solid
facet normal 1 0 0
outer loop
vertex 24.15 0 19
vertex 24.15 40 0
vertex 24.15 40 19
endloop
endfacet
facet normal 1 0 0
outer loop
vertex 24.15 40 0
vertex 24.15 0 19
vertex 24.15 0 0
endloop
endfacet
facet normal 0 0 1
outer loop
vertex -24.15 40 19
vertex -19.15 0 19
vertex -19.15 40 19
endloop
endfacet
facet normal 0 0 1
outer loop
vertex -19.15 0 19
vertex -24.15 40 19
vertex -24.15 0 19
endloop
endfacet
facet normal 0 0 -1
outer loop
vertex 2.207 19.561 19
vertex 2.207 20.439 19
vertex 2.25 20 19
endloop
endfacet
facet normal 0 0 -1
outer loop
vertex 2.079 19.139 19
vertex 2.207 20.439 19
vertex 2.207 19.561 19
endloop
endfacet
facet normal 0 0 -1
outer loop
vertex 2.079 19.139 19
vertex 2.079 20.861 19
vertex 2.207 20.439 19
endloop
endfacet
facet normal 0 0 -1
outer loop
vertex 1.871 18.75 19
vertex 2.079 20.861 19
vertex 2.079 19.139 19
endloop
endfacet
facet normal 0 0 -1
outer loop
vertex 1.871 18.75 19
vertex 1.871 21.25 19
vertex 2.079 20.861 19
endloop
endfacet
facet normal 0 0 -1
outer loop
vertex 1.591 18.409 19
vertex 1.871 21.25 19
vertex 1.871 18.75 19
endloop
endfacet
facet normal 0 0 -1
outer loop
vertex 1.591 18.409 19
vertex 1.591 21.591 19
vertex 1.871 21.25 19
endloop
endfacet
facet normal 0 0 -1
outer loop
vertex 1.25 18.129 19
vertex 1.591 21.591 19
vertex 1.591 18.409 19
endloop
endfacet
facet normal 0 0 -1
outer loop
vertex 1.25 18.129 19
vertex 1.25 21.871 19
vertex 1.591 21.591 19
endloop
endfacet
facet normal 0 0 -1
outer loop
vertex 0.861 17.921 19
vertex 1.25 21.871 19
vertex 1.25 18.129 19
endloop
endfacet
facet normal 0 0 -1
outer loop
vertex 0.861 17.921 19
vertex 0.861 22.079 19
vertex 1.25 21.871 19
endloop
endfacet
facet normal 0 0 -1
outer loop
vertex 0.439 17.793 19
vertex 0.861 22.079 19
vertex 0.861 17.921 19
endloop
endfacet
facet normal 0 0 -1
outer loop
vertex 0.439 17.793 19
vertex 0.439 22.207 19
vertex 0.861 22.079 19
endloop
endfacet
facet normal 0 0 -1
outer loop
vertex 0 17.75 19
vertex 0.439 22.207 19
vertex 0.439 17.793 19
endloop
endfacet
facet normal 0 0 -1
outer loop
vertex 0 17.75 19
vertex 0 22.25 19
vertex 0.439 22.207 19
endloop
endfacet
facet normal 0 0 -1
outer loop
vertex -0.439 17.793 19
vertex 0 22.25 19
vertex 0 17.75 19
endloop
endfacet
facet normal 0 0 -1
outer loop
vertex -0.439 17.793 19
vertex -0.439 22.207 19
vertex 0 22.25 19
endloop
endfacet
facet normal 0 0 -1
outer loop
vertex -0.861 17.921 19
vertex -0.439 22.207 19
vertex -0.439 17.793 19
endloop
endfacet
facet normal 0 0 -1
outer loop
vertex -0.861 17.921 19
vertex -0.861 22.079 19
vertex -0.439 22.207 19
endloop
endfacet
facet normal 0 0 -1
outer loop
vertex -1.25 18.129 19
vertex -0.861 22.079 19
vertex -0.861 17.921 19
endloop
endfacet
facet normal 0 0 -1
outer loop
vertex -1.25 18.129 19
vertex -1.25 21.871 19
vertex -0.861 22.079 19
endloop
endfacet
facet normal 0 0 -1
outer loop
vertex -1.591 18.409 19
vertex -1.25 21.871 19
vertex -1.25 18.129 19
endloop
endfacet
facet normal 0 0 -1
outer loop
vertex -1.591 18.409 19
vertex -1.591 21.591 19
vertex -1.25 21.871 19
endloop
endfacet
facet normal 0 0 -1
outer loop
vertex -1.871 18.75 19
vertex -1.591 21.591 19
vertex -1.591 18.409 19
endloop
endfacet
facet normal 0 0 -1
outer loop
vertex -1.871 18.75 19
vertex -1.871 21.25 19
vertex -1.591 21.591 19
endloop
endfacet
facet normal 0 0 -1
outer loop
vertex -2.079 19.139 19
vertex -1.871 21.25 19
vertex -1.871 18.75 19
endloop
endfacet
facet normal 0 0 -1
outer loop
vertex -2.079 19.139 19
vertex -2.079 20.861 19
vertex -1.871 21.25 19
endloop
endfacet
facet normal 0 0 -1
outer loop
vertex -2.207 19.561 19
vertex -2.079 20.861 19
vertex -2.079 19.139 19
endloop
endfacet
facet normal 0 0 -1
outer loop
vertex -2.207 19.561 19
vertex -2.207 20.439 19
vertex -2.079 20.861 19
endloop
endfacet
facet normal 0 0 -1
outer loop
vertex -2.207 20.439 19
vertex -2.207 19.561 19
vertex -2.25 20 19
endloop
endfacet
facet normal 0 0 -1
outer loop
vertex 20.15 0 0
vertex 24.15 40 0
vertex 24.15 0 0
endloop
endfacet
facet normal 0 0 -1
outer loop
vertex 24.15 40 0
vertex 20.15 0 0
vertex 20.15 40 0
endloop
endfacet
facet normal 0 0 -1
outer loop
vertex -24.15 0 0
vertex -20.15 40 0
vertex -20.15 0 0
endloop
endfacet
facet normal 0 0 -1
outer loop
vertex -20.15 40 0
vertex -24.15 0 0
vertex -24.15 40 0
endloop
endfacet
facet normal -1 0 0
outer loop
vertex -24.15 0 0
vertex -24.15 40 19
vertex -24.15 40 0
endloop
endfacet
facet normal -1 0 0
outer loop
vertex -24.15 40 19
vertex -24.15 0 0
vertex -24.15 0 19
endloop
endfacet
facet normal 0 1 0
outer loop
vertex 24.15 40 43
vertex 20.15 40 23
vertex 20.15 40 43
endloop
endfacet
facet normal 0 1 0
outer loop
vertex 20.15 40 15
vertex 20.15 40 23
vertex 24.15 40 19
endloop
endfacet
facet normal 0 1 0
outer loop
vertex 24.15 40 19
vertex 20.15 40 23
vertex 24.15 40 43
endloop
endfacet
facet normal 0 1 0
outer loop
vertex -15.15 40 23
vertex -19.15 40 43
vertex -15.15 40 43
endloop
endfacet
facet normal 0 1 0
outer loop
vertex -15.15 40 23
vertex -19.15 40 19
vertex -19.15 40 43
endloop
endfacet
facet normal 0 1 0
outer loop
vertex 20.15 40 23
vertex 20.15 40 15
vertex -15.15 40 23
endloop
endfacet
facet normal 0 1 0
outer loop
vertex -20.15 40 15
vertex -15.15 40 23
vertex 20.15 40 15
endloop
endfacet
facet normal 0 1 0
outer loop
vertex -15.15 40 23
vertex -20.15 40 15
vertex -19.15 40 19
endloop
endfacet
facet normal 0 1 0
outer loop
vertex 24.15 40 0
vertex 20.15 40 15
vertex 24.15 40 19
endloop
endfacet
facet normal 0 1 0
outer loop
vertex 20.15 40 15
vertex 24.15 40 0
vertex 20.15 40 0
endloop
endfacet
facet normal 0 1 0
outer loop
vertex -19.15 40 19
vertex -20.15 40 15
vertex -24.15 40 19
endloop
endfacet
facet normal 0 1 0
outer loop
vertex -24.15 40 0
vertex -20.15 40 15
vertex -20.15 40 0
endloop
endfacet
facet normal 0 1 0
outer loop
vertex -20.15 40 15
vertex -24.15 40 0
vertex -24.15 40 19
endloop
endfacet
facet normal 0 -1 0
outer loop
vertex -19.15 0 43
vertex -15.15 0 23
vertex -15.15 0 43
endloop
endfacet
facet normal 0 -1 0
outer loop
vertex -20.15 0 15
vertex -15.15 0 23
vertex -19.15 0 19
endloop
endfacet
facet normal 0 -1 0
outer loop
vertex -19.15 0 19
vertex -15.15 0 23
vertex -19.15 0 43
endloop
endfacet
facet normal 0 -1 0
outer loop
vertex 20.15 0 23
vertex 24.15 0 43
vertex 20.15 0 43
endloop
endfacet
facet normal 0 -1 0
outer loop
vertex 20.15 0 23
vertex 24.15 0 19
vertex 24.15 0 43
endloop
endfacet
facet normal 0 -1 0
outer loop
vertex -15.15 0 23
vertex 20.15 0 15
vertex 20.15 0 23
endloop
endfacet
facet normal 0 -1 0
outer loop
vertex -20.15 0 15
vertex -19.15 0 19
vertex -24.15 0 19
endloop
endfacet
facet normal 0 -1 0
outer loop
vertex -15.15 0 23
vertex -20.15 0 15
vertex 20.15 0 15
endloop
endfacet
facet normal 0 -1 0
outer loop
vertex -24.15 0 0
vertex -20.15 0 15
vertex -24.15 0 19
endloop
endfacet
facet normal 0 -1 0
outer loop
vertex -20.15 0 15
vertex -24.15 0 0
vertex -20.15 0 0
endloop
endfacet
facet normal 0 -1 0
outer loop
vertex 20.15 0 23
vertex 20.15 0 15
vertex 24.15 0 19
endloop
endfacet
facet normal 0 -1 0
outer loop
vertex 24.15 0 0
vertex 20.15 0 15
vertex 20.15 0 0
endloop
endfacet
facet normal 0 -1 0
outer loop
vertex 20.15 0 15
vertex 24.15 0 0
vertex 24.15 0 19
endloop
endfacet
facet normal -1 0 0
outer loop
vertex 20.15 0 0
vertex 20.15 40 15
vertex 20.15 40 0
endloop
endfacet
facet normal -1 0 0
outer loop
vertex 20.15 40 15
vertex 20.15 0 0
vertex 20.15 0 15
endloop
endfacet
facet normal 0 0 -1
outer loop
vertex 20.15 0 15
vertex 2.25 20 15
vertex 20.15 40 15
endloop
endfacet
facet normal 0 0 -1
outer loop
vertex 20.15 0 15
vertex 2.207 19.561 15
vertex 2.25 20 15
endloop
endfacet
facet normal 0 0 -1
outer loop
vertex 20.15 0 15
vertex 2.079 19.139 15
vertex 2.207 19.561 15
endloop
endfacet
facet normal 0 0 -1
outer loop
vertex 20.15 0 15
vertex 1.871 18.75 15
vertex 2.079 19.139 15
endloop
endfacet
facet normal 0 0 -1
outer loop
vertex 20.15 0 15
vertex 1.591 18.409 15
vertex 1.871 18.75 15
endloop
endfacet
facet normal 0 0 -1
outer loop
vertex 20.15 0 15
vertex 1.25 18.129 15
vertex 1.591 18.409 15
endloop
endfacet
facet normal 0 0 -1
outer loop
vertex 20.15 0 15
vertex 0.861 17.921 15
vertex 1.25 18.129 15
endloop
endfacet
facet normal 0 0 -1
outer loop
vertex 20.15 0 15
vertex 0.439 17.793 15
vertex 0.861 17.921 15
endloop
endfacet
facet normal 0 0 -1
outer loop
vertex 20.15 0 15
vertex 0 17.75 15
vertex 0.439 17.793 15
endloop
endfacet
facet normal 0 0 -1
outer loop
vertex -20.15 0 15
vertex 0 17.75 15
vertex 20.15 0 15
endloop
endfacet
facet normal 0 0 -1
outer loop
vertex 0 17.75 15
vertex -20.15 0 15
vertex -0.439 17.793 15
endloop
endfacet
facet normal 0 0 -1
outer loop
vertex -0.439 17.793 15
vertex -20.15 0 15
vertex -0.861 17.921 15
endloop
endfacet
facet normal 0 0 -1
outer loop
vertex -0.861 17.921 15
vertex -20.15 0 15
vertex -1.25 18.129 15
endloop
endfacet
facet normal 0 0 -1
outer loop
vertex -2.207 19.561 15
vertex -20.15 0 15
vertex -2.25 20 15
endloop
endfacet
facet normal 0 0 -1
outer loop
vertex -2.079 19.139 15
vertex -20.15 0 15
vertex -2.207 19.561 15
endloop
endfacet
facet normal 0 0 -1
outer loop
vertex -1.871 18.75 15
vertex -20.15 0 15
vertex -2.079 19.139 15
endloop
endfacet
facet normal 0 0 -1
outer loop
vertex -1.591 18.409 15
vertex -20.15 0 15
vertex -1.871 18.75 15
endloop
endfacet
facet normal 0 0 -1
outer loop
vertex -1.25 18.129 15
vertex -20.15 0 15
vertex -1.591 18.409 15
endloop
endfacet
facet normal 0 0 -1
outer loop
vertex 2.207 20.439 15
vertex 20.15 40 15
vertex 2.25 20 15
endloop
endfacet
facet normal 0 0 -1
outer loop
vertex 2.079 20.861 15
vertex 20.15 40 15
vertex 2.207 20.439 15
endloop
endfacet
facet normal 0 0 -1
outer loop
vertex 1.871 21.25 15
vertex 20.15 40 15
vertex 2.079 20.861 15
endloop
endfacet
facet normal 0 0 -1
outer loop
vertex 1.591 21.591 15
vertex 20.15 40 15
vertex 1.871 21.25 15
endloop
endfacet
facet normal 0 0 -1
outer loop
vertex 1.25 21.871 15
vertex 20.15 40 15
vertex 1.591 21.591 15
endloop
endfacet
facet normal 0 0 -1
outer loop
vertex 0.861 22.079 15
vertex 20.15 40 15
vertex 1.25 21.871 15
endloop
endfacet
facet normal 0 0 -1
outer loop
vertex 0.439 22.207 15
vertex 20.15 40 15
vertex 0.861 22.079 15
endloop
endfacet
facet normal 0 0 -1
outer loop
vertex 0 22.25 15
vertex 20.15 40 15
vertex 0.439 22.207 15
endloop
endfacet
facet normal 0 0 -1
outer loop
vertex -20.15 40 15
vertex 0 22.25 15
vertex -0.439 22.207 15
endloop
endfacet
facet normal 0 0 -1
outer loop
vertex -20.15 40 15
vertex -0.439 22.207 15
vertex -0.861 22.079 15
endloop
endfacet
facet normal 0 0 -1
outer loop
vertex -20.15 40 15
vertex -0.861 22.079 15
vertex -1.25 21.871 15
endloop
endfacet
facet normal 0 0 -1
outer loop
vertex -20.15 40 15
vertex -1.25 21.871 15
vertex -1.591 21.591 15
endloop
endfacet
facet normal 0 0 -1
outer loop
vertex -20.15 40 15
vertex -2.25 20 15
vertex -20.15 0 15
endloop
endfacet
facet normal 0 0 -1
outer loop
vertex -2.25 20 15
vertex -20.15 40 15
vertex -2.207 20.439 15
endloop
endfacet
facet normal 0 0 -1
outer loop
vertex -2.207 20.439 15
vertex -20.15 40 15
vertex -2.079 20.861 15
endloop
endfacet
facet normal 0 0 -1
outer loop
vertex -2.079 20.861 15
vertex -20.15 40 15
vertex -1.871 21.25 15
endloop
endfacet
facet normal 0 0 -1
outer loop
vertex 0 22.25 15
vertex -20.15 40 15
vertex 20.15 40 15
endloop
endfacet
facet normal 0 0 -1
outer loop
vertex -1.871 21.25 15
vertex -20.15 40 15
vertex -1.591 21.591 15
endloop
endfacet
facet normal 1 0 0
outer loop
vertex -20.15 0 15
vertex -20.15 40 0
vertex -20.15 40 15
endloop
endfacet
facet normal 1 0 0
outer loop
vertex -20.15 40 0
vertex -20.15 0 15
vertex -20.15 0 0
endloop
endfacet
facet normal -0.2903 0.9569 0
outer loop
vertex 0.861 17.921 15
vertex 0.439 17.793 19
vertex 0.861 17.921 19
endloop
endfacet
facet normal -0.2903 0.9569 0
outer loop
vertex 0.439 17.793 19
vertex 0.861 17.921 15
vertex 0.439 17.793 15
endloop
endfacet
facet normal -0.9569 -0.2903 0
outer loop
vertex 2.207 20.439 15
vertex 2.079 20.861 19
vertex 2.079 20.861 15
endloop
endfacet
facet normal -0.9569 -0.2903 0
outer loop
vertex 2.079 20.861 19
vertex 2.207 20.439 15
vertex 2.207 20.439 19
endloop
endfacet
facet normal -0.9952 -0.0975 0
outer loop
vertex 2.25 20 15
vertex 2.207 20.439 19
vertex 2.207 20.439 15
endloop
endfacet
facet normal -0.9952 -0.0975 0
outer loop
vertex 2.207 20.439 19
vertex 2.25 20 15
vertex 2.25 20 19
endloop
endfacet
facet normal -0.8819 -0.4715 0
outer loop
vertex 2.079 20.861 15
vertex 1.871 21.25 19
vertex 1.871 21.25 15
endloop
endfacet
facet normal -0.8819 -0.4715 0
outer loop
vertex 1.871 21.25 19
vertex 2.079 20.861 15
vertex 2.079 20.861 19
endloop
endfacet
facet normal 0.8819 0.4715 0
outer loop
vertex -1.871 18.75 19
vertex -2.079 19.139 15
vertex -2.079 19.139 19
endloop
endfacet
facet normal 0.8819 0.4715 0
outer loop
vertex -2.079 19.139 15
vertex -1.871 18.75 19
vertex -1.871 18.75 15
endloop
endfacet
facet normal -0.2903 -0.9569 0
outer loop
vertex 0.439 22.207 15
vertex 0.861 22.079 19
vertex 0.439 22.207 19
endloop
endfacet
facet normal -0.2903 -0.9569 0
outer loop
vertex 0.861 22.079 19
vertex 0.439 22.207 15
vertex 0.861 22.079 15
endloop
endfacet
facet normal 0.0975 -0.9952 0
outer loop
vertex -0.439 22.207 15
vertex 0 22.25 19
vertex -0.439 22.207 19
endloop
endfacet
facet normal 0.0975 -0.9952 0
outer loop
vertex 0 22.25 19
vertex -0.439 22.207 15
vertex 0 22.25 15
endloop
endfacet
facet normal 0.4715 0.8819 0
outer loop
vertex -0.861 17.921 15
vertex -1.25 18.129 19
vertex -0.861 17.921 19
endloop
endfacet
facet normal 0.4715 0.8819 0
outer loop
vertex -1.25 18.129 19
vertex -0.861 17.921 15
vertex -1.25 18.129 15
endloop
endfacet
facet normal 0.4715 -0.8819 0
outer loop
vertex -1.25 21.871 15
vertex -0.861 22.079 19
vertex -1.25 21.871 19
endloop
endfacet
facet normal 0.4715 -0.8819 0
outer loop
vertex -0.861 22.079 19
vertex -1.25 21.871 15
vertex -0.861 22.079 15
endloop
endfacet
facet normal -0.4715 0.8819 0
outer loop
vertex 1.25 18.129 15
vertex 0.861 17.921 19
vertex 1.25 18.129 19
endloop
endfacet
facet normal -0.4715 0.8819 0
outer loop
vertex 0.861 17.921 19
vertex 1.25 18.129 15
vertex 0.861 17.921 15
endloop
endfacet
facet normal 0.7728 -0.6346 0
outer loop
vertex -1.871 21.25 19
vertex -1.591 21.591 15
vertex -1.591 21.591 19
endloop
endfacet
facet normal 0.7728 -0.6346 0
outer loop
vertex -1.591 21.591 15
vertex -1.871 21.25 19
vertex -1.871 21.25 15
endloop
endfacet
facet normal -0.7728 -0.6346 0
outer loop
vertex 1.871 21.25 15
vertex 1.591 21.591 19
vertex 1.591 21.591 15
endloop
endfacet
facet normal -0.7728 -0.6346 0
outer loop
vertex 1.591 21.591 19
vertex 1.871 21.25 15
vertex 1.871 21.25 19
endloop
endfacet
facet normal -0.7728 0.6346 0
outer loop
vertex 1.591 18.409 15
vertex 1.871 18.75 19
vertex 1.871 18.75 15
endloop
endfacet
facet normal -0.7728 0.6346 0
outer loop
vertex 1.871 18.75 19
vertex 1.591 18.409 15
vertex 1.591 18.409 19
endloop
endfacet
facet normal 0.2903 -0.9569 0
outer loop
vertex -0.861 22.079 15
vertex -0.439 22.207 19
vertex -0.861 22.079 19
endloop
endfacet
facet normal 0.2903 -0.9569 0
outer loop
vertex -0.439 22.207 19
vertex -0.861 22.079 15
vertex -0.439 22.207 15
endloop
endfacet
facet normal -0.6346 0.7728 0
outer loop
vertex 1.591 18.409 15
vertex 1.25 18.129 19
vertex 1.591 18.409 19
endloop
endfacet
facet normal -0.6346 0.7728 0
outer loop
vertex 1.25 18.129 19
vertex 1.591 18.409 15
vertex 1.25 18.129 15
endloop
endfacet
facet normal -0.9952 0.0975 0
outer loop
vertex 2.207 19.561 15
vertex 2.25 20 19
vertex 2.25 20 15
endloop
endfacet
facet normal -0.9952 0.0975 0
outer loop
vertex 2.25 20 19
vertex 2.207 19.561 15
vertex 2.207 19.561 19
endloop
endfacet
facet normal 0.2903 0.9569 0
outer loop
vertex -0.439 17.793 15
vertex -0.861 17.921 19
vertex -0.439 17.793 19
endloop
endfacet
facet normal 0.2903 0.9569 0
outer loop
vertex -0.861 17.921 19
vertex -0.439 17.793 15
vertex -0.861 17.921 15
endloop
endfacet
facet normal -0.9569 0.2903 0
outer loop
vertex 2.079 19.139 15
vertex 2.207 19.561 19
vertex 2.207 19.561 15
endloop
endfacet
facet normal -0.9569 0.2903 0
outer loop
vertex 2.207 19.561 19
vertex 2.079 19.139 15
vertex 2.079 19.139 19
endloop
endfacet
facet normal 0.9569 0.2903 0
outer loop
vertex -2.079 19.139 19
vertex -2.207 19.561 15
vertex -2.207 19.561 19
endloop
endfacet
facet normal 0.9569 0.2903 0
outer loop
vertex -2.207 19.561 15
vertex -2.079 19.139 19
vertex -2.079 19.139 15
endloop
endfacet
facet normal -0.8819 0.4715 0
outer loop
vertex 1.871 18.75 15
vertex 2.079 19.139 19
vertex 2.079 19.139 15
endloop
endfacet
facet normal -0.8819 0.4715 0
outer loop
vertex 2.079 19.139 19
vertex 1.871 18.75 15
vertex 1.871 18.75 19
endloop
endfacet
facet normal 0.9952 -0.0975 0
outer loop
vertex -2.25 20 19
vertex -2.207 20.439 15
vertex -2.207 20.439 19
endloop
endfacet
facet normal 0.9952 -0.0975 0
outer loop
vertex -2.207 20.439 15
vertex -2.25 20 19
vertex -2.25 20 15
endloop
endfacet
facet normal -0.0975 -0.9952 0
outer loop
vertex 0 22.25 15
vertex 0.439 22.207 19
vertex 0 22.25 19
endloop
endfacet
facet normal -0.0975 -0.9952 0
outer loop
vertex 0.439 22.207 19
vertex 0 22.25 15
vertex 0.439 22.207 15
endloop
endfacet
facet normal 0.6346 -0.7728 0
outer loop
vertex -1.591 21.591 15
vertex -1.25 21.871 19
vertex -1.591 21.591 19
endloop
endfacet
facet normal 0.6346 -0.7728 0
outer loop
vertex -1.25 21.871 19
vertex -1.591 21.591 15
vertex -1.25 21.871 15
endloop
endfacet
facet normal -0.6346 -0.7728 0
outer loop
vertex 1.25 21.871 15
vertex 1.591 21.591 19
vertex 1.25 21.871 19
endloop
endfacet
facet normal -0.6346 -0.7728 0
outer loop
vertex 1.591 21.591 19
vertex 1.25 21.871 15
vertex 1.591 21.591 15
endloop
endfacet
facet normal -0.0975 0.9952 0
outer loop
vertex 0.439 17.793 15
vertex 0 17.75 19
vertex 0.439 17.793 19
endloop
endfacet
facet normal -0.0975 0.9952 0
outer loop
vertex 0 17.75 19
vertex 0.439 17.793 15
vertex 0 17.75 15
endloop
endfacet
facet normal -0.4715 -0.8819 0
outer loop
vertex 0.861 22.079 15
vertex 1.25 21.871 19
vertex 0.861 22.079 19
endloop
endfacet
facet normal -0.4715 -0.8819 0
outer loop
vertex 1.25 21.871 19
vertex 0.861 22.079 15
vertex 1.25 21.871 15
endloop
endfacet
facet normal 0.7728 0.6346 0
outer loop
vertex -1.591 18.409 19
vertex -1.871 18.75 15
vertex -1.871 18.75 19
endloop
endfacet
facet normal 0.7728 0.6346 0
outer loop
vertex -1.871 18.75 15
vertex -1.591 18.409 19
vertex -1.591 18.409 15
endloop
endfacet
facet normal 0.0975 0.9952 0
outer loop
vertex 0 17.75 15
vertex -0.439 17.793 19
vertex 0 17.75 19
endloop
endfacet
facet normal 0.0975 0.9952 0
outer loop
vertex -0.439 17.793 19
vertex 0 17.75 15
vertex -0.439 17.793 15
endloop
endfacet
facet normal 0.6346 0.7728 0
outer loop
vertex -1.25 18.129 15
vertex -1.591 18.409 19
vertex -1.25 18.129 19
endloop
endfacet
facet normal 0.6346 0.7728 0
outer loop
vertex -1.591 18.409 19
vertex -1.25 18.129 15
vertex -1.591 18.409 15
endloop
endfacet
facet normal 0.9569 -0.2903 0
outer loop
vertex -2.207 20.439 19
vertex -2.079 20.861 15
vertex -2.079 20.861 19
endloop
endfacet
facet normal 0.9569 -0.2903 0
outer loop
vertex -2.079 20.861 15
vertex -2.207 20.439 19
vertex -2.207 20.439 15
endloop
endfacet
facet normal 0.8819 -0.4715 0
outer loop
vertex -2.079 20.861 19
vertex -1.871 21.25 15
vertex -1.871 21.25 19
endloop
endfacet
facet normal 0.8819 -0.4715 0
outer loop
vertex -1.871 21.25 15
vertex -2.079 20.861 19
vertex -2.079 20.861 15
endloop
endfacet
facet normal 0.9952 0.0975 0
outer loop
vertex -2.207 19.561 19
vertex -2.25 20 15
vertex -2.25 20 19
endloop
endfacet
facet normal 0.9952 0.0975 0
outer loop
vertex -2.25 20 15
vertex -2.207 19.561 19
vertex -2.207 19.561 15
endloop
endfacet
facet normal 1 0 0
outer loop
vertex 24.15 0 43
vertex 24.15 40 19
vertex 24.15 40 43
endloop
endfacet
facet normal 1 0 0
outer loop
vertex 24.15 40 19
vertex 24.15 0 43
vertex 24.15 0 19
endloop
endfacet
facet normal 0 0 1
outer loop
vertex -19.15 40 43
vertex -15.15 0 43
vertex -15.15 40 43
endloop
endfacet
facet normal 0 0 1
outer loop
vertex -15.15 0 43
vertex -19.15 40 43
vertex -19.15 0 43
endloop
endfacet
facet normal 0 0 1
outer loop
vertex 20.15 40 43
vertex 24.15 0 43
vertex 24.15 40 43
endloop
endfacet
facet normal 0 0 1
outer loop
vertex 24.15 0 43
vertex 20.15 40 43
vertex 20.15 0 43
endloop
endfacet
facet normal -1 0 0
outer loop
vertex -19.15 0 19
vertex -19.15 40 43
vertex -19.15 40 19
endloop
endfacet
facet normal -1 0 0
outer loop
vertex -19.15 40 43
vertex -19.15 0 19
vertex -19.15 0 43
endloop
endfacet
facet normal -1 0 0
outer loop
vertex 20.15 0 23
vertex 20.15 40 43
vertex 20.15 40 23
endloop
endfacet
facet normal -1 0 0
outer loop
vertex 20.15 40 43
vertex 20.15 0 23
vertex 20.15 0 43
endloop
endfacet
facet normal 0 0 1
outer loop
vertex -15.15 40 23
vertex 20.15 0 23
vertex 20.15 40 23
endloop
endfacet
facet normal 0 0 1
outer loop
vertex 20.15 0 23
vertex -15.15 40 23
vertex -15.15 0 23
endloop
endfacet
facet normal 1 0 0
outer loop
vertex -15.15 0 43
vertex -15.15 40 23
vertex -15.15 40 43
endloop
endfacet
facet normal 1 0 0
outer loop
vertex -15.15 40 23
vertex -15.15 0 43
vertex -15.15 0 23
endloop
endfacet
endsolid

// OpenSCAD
// Panel clip: a C-shaped jaw that grips a solar panel frame edge of measured thickness, on a
// saddle that sits over a timber rail of measured width, with one wood screw hole through
// the saddle. Class B hardware-fitted part. Licence: CC0 1.0. Authored for the michani demo,
// 2026. Family reference: open-source printed solar racking (Wittbrodt and Pearce, 2017).

// Opening of the jaw: the measured frame thickness plus clearance
jaw_opening = 35.3; // [15:60]
// Width of the saddle opening: the measured rail width plus clearance
saddle_opening = 40.3; // [20:100]
// How far the jaw reaches over the frame edge
clip_depth = 20; // [10:40]
// Wall thickness of the jaw and the saddle
wall_thickness = 4; // [2.4:8]
// Diameter of the wood screw hole through the saddle top
screw_hole_diameter = 4.5; // [3:8]
// Length of the clip along the rail
clip_length = 40; // [20:80]

$fn = 32;

saddle_height = 15;
jaw_outer = jaw_opening + 2 * wall_thickness;

module saddle() {
  // An inverted U that sits over the rail: solid block minus the rail slot.
  difference() {
    translate([-(saddle_opening / 2 + wall_thickness), 0, 0])
      cube([saddle_opening + 2 * wall_thickness, clip_length, saddle_height + wall_thickness]);
    translate([-saddle_opening / 2, -1, -1])
      cube([saddle_opening, clip_length + 2, saddle_height + 1]);
    // Screw hole down through the saddle top, centred on the rail.
    translate([0, clip_length / 2, saddle_height - 1])
      cylinder(h = wall_thickness + 2, d = screw_hole_diameter);
  }
}

module jaw() {
  // A C-shaped channel standing on the saddle top, open toward +x, gripping the frame edge.
  translate([saddle_opening / 2 + wall_thickness - jaw_outer, 0, saddle_height + wall_thickness])
    difference() {
      cube([jaw_outer, clip_length, clip_depth + wall_thickness]);
      translate([wall_thickness, -1, wall_thickness])
        cube([jaw_opening, clip_length + 2, clip_depth + 1]);
    }
}

union() {
  saddle();
  jaw();
}
